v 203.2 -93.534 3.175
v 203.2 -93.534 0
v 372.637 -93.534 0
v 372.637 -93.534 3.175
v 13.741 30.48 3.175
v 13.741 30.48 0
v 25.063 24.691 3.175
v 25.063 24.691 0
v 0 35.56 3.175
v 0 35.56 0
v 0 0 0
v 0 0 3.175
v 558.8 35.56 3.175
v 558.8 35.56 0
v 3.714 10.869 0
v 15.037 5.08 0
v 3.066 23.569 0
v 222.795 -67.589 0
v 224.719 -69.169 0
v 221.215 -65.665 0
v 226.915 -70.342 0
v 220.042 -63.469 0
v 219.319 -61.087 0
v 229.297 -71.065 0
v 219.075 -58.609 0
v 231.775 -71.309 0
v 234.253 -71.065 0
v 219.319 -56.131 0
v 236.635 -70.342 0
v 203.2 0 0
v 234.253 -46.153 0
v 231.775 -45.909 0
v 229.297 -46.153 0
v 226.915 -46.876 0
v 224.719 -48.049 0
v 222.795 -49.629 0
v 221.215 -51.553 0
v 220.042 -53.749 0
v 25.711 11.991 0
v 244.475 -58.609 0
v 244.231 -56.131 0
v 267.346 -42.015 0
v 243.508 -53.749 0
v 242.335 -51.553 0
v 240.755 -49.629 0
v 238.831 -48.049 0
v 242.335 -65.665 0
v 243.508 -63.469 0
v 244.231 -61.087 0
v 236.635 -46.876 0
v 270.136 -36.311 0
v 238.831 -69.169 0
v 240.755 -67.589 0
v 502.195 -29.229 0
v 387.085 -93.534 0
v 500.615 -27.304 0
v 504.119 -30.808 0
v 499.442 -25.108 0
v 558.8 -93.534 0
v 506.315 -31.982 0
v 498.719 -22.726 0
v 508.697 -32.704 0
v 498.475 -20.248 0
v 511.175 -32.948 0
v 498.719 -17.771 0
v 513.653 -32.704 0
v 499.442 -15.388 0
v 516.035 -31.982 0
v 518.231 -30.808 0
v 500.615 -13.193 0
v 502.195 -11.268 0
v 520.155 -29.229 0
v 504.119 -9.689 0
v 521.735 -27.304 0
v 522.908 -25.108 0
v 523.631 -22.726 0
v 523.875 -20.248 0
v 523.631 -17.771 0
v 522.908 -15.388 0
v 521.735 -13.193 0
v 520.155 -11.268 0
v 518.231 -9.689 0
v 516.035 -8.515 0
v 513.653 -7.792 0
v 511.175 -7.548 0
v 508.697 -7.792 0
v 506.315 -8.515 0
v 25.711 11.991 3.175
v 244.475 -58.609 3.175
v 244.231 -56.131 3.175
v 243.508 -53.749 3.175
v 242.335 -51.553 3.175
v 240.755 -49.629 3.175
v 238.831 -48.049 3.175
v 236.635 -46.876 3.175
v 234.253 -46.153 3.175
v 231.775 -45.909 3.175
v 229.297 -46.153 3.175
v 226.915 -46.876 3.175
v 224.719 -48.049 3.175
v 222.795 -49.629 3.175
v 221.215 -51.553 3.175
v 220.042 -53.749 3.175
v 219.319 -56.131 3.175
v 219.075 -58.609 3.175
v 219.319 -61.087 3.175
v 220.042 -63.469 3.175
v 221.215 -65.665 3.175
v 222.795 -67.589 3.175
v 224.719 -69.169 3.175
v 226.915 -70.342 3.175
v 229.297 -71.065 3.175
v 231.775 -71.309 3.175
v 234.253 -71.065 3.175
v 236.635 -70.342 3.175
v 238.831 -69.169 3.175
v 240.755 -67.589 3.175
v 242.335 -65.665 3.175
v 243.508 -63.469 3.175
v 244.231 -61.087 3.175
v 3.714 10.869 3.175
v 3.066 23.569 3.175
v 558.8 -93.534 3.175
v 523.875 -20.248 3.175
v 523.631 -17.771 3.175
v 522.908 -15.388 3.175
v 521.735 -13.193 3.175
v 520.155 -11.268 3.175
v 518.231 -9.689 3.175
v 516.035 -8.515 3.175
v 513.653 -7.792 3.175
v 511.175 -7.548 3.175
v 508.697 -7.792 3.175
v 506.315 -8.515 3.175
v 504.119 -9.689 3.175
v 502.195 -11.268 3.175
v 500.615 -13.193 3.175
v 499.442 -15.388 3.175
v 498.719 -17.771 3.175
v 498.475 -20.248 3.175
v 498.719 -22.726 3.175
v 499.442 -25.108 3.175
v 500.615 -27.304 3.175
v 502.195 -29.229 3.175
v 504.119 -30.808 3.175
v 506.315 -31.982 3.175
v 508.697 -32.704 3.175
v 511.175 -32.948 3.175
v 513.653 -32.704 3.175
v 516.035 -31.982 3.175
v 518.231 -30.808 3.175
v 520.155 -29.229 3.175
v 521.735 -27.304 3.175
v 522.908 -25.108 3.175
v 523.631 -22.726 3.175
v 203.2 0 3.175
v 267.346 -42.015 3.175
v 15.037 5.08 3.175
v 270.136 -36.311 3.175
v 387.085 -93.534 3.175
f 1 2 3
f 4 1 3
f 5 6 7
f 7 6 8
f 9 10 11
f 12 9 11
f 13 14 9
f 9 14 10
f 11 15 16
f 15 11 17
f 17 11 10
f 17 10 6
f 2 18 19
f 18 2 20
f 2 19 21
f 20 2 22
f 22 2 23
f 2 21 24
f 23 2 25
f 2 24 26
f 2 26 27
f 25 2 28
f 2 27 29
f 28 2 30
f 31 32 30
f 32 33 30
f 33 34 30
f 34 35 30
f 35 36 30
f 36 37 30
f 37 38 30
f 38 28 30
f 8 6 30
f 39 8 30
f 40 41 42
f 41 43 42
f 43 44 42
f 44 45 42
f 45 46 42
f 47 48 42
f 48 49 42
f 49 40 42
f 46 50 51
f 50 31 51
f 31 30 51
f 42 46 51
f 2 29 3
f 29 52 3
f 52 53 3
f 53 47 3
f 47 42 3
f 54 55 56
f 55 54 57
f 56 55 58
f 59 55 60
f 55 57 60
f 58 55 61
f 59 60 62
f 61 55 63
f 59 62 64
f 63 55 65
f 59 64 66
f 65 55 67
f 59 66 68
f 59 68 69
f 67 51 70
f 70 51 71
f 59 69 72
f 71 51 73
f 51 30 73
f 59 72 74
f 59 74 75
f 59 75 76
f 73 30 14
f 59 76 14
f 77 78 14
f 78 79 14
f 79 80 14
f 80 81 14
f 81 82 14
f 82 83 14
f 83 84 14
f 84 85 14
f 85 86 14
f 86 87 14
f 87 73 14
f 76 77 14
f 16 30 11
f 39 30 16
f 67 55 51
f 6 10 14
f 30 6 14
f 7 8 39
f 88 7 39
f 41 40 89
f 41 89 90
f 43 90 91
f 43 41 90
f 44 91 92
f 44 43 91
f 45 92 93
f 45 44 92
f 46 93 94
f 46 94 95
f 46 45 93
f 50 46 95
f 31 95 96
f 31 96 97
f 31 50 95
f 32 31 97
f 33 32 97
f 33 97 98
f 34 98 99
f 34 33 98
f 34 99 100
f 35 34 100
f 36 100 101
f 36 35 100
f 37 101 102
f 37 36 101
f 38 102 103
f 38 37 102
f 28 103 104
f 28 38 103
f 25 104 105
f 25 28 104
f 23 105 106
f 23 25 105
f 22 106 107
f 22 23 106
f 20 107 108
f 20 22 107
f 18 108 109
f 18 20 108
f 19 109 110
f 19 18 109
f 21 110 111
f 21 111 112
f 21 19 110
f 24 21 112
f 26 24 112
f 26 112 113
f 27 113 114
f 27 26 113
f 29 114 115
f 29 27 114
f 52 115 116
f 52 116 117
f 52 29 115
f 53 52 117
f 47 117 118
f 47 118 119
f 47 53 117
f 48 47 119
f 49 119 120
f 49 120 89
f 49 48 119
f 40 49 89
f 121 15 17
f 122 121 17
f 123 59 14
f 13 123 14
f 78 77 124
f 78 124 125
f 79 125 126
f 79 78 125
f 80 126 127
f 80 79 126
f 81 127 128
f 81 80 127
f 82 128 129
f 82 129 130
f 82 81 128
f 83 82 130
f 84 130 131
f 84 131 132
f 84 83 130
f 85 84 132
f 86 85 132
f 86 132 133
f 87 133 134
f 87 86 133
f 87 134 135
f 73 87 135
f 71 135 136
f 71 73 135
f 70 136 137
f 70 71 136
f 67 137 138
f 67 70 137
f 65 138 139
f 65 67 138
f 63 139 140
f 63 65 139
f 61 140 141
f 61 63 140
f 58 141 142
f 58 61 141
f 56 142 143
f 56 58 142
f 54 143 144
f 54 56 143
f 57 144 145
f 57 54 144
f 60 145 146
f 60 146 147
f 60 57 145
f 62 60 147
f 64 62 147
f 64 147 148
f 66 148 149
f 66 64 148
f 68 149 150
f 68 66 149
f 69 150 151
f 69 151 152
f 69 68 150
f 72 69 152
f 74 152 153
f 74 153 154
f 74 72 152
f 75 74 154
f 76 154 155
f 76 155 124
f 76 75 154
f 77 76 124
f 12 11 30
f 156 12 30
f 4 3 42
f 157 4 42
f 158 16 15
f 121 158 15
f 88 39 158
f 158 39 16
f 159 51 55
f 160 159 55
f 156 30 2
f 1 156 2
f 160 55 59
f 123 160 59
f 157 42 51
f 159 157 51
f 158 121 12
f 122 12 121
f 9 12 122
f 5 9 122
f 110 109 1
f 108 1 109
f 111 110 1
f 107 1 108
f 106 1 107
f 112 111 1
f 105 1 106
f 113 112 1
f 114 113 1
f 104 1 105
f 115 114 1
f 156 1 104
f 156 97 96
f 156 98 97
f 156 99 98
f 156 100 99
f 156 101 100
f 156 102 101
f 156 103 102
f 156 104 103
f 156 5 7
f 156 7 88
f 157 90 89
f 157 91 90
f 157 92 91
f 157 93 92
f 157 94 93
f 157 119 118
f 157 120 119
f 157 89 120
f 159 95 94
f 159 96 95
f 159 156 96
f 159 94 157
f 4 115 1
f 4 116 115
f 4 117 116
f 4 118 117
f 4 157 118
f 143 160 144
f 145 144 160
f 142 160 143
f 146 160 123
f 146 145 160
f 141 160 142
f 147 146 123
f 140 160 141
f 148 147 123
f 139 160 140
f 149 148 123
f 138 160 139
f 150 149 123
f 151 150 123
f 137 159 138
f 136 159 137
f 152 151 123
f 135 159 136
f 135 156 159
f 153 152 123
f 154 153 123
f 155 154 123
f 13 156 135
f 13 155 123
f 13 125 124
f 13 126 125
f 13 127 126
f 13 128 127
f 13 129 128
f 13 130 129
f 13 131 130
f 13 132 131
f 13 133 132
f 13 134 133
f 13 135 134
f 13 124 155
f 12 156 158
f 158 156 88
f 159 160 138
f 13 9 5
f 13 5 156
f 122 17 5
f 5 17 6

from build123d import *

# Parameters (mm, degrees)
SKETCH5_R           = 12.7
BOSS_EXTRUDE4_DEPTH = 3.175


with BuildPart() as part:
    # Sketch5 → Boss-Extrude4 (new body)
    with BuildSketch(Plane.XY):
        Polygon((0, 35.56), (0, 0), (203.2, 0), (203.2, -93.533944169), (372.637377726, -93.533944169), (267.345580387, -42.014632685), (270.136458661, -36.310818307), (387.085338563, -93.533944169), (558.8, -93.533944169), (558.8, 35.56), align=None)
        with Locations((231.775, -58.608944169)):
            Circle(SKETCH5_R, mode=Mode.SUBTRACT)
        Polygon((25.06325275, 24.691281209), (25.711364465, 11.991281209), (15.036897694, 5.08), (3.714319208, 10.868718791), (3.066207494, 23.568718791), (13.740674265, 30.48), align=None, mode=Mode.SUBTRACT)
        with Locations((511.175, -20.248310315)):
            Circle(SKETCH5_R, mode=Mode.SUBTRACT)
    extrude(amount=BOSS_EXTRUDE4_DEPTH)


solid = part.part
